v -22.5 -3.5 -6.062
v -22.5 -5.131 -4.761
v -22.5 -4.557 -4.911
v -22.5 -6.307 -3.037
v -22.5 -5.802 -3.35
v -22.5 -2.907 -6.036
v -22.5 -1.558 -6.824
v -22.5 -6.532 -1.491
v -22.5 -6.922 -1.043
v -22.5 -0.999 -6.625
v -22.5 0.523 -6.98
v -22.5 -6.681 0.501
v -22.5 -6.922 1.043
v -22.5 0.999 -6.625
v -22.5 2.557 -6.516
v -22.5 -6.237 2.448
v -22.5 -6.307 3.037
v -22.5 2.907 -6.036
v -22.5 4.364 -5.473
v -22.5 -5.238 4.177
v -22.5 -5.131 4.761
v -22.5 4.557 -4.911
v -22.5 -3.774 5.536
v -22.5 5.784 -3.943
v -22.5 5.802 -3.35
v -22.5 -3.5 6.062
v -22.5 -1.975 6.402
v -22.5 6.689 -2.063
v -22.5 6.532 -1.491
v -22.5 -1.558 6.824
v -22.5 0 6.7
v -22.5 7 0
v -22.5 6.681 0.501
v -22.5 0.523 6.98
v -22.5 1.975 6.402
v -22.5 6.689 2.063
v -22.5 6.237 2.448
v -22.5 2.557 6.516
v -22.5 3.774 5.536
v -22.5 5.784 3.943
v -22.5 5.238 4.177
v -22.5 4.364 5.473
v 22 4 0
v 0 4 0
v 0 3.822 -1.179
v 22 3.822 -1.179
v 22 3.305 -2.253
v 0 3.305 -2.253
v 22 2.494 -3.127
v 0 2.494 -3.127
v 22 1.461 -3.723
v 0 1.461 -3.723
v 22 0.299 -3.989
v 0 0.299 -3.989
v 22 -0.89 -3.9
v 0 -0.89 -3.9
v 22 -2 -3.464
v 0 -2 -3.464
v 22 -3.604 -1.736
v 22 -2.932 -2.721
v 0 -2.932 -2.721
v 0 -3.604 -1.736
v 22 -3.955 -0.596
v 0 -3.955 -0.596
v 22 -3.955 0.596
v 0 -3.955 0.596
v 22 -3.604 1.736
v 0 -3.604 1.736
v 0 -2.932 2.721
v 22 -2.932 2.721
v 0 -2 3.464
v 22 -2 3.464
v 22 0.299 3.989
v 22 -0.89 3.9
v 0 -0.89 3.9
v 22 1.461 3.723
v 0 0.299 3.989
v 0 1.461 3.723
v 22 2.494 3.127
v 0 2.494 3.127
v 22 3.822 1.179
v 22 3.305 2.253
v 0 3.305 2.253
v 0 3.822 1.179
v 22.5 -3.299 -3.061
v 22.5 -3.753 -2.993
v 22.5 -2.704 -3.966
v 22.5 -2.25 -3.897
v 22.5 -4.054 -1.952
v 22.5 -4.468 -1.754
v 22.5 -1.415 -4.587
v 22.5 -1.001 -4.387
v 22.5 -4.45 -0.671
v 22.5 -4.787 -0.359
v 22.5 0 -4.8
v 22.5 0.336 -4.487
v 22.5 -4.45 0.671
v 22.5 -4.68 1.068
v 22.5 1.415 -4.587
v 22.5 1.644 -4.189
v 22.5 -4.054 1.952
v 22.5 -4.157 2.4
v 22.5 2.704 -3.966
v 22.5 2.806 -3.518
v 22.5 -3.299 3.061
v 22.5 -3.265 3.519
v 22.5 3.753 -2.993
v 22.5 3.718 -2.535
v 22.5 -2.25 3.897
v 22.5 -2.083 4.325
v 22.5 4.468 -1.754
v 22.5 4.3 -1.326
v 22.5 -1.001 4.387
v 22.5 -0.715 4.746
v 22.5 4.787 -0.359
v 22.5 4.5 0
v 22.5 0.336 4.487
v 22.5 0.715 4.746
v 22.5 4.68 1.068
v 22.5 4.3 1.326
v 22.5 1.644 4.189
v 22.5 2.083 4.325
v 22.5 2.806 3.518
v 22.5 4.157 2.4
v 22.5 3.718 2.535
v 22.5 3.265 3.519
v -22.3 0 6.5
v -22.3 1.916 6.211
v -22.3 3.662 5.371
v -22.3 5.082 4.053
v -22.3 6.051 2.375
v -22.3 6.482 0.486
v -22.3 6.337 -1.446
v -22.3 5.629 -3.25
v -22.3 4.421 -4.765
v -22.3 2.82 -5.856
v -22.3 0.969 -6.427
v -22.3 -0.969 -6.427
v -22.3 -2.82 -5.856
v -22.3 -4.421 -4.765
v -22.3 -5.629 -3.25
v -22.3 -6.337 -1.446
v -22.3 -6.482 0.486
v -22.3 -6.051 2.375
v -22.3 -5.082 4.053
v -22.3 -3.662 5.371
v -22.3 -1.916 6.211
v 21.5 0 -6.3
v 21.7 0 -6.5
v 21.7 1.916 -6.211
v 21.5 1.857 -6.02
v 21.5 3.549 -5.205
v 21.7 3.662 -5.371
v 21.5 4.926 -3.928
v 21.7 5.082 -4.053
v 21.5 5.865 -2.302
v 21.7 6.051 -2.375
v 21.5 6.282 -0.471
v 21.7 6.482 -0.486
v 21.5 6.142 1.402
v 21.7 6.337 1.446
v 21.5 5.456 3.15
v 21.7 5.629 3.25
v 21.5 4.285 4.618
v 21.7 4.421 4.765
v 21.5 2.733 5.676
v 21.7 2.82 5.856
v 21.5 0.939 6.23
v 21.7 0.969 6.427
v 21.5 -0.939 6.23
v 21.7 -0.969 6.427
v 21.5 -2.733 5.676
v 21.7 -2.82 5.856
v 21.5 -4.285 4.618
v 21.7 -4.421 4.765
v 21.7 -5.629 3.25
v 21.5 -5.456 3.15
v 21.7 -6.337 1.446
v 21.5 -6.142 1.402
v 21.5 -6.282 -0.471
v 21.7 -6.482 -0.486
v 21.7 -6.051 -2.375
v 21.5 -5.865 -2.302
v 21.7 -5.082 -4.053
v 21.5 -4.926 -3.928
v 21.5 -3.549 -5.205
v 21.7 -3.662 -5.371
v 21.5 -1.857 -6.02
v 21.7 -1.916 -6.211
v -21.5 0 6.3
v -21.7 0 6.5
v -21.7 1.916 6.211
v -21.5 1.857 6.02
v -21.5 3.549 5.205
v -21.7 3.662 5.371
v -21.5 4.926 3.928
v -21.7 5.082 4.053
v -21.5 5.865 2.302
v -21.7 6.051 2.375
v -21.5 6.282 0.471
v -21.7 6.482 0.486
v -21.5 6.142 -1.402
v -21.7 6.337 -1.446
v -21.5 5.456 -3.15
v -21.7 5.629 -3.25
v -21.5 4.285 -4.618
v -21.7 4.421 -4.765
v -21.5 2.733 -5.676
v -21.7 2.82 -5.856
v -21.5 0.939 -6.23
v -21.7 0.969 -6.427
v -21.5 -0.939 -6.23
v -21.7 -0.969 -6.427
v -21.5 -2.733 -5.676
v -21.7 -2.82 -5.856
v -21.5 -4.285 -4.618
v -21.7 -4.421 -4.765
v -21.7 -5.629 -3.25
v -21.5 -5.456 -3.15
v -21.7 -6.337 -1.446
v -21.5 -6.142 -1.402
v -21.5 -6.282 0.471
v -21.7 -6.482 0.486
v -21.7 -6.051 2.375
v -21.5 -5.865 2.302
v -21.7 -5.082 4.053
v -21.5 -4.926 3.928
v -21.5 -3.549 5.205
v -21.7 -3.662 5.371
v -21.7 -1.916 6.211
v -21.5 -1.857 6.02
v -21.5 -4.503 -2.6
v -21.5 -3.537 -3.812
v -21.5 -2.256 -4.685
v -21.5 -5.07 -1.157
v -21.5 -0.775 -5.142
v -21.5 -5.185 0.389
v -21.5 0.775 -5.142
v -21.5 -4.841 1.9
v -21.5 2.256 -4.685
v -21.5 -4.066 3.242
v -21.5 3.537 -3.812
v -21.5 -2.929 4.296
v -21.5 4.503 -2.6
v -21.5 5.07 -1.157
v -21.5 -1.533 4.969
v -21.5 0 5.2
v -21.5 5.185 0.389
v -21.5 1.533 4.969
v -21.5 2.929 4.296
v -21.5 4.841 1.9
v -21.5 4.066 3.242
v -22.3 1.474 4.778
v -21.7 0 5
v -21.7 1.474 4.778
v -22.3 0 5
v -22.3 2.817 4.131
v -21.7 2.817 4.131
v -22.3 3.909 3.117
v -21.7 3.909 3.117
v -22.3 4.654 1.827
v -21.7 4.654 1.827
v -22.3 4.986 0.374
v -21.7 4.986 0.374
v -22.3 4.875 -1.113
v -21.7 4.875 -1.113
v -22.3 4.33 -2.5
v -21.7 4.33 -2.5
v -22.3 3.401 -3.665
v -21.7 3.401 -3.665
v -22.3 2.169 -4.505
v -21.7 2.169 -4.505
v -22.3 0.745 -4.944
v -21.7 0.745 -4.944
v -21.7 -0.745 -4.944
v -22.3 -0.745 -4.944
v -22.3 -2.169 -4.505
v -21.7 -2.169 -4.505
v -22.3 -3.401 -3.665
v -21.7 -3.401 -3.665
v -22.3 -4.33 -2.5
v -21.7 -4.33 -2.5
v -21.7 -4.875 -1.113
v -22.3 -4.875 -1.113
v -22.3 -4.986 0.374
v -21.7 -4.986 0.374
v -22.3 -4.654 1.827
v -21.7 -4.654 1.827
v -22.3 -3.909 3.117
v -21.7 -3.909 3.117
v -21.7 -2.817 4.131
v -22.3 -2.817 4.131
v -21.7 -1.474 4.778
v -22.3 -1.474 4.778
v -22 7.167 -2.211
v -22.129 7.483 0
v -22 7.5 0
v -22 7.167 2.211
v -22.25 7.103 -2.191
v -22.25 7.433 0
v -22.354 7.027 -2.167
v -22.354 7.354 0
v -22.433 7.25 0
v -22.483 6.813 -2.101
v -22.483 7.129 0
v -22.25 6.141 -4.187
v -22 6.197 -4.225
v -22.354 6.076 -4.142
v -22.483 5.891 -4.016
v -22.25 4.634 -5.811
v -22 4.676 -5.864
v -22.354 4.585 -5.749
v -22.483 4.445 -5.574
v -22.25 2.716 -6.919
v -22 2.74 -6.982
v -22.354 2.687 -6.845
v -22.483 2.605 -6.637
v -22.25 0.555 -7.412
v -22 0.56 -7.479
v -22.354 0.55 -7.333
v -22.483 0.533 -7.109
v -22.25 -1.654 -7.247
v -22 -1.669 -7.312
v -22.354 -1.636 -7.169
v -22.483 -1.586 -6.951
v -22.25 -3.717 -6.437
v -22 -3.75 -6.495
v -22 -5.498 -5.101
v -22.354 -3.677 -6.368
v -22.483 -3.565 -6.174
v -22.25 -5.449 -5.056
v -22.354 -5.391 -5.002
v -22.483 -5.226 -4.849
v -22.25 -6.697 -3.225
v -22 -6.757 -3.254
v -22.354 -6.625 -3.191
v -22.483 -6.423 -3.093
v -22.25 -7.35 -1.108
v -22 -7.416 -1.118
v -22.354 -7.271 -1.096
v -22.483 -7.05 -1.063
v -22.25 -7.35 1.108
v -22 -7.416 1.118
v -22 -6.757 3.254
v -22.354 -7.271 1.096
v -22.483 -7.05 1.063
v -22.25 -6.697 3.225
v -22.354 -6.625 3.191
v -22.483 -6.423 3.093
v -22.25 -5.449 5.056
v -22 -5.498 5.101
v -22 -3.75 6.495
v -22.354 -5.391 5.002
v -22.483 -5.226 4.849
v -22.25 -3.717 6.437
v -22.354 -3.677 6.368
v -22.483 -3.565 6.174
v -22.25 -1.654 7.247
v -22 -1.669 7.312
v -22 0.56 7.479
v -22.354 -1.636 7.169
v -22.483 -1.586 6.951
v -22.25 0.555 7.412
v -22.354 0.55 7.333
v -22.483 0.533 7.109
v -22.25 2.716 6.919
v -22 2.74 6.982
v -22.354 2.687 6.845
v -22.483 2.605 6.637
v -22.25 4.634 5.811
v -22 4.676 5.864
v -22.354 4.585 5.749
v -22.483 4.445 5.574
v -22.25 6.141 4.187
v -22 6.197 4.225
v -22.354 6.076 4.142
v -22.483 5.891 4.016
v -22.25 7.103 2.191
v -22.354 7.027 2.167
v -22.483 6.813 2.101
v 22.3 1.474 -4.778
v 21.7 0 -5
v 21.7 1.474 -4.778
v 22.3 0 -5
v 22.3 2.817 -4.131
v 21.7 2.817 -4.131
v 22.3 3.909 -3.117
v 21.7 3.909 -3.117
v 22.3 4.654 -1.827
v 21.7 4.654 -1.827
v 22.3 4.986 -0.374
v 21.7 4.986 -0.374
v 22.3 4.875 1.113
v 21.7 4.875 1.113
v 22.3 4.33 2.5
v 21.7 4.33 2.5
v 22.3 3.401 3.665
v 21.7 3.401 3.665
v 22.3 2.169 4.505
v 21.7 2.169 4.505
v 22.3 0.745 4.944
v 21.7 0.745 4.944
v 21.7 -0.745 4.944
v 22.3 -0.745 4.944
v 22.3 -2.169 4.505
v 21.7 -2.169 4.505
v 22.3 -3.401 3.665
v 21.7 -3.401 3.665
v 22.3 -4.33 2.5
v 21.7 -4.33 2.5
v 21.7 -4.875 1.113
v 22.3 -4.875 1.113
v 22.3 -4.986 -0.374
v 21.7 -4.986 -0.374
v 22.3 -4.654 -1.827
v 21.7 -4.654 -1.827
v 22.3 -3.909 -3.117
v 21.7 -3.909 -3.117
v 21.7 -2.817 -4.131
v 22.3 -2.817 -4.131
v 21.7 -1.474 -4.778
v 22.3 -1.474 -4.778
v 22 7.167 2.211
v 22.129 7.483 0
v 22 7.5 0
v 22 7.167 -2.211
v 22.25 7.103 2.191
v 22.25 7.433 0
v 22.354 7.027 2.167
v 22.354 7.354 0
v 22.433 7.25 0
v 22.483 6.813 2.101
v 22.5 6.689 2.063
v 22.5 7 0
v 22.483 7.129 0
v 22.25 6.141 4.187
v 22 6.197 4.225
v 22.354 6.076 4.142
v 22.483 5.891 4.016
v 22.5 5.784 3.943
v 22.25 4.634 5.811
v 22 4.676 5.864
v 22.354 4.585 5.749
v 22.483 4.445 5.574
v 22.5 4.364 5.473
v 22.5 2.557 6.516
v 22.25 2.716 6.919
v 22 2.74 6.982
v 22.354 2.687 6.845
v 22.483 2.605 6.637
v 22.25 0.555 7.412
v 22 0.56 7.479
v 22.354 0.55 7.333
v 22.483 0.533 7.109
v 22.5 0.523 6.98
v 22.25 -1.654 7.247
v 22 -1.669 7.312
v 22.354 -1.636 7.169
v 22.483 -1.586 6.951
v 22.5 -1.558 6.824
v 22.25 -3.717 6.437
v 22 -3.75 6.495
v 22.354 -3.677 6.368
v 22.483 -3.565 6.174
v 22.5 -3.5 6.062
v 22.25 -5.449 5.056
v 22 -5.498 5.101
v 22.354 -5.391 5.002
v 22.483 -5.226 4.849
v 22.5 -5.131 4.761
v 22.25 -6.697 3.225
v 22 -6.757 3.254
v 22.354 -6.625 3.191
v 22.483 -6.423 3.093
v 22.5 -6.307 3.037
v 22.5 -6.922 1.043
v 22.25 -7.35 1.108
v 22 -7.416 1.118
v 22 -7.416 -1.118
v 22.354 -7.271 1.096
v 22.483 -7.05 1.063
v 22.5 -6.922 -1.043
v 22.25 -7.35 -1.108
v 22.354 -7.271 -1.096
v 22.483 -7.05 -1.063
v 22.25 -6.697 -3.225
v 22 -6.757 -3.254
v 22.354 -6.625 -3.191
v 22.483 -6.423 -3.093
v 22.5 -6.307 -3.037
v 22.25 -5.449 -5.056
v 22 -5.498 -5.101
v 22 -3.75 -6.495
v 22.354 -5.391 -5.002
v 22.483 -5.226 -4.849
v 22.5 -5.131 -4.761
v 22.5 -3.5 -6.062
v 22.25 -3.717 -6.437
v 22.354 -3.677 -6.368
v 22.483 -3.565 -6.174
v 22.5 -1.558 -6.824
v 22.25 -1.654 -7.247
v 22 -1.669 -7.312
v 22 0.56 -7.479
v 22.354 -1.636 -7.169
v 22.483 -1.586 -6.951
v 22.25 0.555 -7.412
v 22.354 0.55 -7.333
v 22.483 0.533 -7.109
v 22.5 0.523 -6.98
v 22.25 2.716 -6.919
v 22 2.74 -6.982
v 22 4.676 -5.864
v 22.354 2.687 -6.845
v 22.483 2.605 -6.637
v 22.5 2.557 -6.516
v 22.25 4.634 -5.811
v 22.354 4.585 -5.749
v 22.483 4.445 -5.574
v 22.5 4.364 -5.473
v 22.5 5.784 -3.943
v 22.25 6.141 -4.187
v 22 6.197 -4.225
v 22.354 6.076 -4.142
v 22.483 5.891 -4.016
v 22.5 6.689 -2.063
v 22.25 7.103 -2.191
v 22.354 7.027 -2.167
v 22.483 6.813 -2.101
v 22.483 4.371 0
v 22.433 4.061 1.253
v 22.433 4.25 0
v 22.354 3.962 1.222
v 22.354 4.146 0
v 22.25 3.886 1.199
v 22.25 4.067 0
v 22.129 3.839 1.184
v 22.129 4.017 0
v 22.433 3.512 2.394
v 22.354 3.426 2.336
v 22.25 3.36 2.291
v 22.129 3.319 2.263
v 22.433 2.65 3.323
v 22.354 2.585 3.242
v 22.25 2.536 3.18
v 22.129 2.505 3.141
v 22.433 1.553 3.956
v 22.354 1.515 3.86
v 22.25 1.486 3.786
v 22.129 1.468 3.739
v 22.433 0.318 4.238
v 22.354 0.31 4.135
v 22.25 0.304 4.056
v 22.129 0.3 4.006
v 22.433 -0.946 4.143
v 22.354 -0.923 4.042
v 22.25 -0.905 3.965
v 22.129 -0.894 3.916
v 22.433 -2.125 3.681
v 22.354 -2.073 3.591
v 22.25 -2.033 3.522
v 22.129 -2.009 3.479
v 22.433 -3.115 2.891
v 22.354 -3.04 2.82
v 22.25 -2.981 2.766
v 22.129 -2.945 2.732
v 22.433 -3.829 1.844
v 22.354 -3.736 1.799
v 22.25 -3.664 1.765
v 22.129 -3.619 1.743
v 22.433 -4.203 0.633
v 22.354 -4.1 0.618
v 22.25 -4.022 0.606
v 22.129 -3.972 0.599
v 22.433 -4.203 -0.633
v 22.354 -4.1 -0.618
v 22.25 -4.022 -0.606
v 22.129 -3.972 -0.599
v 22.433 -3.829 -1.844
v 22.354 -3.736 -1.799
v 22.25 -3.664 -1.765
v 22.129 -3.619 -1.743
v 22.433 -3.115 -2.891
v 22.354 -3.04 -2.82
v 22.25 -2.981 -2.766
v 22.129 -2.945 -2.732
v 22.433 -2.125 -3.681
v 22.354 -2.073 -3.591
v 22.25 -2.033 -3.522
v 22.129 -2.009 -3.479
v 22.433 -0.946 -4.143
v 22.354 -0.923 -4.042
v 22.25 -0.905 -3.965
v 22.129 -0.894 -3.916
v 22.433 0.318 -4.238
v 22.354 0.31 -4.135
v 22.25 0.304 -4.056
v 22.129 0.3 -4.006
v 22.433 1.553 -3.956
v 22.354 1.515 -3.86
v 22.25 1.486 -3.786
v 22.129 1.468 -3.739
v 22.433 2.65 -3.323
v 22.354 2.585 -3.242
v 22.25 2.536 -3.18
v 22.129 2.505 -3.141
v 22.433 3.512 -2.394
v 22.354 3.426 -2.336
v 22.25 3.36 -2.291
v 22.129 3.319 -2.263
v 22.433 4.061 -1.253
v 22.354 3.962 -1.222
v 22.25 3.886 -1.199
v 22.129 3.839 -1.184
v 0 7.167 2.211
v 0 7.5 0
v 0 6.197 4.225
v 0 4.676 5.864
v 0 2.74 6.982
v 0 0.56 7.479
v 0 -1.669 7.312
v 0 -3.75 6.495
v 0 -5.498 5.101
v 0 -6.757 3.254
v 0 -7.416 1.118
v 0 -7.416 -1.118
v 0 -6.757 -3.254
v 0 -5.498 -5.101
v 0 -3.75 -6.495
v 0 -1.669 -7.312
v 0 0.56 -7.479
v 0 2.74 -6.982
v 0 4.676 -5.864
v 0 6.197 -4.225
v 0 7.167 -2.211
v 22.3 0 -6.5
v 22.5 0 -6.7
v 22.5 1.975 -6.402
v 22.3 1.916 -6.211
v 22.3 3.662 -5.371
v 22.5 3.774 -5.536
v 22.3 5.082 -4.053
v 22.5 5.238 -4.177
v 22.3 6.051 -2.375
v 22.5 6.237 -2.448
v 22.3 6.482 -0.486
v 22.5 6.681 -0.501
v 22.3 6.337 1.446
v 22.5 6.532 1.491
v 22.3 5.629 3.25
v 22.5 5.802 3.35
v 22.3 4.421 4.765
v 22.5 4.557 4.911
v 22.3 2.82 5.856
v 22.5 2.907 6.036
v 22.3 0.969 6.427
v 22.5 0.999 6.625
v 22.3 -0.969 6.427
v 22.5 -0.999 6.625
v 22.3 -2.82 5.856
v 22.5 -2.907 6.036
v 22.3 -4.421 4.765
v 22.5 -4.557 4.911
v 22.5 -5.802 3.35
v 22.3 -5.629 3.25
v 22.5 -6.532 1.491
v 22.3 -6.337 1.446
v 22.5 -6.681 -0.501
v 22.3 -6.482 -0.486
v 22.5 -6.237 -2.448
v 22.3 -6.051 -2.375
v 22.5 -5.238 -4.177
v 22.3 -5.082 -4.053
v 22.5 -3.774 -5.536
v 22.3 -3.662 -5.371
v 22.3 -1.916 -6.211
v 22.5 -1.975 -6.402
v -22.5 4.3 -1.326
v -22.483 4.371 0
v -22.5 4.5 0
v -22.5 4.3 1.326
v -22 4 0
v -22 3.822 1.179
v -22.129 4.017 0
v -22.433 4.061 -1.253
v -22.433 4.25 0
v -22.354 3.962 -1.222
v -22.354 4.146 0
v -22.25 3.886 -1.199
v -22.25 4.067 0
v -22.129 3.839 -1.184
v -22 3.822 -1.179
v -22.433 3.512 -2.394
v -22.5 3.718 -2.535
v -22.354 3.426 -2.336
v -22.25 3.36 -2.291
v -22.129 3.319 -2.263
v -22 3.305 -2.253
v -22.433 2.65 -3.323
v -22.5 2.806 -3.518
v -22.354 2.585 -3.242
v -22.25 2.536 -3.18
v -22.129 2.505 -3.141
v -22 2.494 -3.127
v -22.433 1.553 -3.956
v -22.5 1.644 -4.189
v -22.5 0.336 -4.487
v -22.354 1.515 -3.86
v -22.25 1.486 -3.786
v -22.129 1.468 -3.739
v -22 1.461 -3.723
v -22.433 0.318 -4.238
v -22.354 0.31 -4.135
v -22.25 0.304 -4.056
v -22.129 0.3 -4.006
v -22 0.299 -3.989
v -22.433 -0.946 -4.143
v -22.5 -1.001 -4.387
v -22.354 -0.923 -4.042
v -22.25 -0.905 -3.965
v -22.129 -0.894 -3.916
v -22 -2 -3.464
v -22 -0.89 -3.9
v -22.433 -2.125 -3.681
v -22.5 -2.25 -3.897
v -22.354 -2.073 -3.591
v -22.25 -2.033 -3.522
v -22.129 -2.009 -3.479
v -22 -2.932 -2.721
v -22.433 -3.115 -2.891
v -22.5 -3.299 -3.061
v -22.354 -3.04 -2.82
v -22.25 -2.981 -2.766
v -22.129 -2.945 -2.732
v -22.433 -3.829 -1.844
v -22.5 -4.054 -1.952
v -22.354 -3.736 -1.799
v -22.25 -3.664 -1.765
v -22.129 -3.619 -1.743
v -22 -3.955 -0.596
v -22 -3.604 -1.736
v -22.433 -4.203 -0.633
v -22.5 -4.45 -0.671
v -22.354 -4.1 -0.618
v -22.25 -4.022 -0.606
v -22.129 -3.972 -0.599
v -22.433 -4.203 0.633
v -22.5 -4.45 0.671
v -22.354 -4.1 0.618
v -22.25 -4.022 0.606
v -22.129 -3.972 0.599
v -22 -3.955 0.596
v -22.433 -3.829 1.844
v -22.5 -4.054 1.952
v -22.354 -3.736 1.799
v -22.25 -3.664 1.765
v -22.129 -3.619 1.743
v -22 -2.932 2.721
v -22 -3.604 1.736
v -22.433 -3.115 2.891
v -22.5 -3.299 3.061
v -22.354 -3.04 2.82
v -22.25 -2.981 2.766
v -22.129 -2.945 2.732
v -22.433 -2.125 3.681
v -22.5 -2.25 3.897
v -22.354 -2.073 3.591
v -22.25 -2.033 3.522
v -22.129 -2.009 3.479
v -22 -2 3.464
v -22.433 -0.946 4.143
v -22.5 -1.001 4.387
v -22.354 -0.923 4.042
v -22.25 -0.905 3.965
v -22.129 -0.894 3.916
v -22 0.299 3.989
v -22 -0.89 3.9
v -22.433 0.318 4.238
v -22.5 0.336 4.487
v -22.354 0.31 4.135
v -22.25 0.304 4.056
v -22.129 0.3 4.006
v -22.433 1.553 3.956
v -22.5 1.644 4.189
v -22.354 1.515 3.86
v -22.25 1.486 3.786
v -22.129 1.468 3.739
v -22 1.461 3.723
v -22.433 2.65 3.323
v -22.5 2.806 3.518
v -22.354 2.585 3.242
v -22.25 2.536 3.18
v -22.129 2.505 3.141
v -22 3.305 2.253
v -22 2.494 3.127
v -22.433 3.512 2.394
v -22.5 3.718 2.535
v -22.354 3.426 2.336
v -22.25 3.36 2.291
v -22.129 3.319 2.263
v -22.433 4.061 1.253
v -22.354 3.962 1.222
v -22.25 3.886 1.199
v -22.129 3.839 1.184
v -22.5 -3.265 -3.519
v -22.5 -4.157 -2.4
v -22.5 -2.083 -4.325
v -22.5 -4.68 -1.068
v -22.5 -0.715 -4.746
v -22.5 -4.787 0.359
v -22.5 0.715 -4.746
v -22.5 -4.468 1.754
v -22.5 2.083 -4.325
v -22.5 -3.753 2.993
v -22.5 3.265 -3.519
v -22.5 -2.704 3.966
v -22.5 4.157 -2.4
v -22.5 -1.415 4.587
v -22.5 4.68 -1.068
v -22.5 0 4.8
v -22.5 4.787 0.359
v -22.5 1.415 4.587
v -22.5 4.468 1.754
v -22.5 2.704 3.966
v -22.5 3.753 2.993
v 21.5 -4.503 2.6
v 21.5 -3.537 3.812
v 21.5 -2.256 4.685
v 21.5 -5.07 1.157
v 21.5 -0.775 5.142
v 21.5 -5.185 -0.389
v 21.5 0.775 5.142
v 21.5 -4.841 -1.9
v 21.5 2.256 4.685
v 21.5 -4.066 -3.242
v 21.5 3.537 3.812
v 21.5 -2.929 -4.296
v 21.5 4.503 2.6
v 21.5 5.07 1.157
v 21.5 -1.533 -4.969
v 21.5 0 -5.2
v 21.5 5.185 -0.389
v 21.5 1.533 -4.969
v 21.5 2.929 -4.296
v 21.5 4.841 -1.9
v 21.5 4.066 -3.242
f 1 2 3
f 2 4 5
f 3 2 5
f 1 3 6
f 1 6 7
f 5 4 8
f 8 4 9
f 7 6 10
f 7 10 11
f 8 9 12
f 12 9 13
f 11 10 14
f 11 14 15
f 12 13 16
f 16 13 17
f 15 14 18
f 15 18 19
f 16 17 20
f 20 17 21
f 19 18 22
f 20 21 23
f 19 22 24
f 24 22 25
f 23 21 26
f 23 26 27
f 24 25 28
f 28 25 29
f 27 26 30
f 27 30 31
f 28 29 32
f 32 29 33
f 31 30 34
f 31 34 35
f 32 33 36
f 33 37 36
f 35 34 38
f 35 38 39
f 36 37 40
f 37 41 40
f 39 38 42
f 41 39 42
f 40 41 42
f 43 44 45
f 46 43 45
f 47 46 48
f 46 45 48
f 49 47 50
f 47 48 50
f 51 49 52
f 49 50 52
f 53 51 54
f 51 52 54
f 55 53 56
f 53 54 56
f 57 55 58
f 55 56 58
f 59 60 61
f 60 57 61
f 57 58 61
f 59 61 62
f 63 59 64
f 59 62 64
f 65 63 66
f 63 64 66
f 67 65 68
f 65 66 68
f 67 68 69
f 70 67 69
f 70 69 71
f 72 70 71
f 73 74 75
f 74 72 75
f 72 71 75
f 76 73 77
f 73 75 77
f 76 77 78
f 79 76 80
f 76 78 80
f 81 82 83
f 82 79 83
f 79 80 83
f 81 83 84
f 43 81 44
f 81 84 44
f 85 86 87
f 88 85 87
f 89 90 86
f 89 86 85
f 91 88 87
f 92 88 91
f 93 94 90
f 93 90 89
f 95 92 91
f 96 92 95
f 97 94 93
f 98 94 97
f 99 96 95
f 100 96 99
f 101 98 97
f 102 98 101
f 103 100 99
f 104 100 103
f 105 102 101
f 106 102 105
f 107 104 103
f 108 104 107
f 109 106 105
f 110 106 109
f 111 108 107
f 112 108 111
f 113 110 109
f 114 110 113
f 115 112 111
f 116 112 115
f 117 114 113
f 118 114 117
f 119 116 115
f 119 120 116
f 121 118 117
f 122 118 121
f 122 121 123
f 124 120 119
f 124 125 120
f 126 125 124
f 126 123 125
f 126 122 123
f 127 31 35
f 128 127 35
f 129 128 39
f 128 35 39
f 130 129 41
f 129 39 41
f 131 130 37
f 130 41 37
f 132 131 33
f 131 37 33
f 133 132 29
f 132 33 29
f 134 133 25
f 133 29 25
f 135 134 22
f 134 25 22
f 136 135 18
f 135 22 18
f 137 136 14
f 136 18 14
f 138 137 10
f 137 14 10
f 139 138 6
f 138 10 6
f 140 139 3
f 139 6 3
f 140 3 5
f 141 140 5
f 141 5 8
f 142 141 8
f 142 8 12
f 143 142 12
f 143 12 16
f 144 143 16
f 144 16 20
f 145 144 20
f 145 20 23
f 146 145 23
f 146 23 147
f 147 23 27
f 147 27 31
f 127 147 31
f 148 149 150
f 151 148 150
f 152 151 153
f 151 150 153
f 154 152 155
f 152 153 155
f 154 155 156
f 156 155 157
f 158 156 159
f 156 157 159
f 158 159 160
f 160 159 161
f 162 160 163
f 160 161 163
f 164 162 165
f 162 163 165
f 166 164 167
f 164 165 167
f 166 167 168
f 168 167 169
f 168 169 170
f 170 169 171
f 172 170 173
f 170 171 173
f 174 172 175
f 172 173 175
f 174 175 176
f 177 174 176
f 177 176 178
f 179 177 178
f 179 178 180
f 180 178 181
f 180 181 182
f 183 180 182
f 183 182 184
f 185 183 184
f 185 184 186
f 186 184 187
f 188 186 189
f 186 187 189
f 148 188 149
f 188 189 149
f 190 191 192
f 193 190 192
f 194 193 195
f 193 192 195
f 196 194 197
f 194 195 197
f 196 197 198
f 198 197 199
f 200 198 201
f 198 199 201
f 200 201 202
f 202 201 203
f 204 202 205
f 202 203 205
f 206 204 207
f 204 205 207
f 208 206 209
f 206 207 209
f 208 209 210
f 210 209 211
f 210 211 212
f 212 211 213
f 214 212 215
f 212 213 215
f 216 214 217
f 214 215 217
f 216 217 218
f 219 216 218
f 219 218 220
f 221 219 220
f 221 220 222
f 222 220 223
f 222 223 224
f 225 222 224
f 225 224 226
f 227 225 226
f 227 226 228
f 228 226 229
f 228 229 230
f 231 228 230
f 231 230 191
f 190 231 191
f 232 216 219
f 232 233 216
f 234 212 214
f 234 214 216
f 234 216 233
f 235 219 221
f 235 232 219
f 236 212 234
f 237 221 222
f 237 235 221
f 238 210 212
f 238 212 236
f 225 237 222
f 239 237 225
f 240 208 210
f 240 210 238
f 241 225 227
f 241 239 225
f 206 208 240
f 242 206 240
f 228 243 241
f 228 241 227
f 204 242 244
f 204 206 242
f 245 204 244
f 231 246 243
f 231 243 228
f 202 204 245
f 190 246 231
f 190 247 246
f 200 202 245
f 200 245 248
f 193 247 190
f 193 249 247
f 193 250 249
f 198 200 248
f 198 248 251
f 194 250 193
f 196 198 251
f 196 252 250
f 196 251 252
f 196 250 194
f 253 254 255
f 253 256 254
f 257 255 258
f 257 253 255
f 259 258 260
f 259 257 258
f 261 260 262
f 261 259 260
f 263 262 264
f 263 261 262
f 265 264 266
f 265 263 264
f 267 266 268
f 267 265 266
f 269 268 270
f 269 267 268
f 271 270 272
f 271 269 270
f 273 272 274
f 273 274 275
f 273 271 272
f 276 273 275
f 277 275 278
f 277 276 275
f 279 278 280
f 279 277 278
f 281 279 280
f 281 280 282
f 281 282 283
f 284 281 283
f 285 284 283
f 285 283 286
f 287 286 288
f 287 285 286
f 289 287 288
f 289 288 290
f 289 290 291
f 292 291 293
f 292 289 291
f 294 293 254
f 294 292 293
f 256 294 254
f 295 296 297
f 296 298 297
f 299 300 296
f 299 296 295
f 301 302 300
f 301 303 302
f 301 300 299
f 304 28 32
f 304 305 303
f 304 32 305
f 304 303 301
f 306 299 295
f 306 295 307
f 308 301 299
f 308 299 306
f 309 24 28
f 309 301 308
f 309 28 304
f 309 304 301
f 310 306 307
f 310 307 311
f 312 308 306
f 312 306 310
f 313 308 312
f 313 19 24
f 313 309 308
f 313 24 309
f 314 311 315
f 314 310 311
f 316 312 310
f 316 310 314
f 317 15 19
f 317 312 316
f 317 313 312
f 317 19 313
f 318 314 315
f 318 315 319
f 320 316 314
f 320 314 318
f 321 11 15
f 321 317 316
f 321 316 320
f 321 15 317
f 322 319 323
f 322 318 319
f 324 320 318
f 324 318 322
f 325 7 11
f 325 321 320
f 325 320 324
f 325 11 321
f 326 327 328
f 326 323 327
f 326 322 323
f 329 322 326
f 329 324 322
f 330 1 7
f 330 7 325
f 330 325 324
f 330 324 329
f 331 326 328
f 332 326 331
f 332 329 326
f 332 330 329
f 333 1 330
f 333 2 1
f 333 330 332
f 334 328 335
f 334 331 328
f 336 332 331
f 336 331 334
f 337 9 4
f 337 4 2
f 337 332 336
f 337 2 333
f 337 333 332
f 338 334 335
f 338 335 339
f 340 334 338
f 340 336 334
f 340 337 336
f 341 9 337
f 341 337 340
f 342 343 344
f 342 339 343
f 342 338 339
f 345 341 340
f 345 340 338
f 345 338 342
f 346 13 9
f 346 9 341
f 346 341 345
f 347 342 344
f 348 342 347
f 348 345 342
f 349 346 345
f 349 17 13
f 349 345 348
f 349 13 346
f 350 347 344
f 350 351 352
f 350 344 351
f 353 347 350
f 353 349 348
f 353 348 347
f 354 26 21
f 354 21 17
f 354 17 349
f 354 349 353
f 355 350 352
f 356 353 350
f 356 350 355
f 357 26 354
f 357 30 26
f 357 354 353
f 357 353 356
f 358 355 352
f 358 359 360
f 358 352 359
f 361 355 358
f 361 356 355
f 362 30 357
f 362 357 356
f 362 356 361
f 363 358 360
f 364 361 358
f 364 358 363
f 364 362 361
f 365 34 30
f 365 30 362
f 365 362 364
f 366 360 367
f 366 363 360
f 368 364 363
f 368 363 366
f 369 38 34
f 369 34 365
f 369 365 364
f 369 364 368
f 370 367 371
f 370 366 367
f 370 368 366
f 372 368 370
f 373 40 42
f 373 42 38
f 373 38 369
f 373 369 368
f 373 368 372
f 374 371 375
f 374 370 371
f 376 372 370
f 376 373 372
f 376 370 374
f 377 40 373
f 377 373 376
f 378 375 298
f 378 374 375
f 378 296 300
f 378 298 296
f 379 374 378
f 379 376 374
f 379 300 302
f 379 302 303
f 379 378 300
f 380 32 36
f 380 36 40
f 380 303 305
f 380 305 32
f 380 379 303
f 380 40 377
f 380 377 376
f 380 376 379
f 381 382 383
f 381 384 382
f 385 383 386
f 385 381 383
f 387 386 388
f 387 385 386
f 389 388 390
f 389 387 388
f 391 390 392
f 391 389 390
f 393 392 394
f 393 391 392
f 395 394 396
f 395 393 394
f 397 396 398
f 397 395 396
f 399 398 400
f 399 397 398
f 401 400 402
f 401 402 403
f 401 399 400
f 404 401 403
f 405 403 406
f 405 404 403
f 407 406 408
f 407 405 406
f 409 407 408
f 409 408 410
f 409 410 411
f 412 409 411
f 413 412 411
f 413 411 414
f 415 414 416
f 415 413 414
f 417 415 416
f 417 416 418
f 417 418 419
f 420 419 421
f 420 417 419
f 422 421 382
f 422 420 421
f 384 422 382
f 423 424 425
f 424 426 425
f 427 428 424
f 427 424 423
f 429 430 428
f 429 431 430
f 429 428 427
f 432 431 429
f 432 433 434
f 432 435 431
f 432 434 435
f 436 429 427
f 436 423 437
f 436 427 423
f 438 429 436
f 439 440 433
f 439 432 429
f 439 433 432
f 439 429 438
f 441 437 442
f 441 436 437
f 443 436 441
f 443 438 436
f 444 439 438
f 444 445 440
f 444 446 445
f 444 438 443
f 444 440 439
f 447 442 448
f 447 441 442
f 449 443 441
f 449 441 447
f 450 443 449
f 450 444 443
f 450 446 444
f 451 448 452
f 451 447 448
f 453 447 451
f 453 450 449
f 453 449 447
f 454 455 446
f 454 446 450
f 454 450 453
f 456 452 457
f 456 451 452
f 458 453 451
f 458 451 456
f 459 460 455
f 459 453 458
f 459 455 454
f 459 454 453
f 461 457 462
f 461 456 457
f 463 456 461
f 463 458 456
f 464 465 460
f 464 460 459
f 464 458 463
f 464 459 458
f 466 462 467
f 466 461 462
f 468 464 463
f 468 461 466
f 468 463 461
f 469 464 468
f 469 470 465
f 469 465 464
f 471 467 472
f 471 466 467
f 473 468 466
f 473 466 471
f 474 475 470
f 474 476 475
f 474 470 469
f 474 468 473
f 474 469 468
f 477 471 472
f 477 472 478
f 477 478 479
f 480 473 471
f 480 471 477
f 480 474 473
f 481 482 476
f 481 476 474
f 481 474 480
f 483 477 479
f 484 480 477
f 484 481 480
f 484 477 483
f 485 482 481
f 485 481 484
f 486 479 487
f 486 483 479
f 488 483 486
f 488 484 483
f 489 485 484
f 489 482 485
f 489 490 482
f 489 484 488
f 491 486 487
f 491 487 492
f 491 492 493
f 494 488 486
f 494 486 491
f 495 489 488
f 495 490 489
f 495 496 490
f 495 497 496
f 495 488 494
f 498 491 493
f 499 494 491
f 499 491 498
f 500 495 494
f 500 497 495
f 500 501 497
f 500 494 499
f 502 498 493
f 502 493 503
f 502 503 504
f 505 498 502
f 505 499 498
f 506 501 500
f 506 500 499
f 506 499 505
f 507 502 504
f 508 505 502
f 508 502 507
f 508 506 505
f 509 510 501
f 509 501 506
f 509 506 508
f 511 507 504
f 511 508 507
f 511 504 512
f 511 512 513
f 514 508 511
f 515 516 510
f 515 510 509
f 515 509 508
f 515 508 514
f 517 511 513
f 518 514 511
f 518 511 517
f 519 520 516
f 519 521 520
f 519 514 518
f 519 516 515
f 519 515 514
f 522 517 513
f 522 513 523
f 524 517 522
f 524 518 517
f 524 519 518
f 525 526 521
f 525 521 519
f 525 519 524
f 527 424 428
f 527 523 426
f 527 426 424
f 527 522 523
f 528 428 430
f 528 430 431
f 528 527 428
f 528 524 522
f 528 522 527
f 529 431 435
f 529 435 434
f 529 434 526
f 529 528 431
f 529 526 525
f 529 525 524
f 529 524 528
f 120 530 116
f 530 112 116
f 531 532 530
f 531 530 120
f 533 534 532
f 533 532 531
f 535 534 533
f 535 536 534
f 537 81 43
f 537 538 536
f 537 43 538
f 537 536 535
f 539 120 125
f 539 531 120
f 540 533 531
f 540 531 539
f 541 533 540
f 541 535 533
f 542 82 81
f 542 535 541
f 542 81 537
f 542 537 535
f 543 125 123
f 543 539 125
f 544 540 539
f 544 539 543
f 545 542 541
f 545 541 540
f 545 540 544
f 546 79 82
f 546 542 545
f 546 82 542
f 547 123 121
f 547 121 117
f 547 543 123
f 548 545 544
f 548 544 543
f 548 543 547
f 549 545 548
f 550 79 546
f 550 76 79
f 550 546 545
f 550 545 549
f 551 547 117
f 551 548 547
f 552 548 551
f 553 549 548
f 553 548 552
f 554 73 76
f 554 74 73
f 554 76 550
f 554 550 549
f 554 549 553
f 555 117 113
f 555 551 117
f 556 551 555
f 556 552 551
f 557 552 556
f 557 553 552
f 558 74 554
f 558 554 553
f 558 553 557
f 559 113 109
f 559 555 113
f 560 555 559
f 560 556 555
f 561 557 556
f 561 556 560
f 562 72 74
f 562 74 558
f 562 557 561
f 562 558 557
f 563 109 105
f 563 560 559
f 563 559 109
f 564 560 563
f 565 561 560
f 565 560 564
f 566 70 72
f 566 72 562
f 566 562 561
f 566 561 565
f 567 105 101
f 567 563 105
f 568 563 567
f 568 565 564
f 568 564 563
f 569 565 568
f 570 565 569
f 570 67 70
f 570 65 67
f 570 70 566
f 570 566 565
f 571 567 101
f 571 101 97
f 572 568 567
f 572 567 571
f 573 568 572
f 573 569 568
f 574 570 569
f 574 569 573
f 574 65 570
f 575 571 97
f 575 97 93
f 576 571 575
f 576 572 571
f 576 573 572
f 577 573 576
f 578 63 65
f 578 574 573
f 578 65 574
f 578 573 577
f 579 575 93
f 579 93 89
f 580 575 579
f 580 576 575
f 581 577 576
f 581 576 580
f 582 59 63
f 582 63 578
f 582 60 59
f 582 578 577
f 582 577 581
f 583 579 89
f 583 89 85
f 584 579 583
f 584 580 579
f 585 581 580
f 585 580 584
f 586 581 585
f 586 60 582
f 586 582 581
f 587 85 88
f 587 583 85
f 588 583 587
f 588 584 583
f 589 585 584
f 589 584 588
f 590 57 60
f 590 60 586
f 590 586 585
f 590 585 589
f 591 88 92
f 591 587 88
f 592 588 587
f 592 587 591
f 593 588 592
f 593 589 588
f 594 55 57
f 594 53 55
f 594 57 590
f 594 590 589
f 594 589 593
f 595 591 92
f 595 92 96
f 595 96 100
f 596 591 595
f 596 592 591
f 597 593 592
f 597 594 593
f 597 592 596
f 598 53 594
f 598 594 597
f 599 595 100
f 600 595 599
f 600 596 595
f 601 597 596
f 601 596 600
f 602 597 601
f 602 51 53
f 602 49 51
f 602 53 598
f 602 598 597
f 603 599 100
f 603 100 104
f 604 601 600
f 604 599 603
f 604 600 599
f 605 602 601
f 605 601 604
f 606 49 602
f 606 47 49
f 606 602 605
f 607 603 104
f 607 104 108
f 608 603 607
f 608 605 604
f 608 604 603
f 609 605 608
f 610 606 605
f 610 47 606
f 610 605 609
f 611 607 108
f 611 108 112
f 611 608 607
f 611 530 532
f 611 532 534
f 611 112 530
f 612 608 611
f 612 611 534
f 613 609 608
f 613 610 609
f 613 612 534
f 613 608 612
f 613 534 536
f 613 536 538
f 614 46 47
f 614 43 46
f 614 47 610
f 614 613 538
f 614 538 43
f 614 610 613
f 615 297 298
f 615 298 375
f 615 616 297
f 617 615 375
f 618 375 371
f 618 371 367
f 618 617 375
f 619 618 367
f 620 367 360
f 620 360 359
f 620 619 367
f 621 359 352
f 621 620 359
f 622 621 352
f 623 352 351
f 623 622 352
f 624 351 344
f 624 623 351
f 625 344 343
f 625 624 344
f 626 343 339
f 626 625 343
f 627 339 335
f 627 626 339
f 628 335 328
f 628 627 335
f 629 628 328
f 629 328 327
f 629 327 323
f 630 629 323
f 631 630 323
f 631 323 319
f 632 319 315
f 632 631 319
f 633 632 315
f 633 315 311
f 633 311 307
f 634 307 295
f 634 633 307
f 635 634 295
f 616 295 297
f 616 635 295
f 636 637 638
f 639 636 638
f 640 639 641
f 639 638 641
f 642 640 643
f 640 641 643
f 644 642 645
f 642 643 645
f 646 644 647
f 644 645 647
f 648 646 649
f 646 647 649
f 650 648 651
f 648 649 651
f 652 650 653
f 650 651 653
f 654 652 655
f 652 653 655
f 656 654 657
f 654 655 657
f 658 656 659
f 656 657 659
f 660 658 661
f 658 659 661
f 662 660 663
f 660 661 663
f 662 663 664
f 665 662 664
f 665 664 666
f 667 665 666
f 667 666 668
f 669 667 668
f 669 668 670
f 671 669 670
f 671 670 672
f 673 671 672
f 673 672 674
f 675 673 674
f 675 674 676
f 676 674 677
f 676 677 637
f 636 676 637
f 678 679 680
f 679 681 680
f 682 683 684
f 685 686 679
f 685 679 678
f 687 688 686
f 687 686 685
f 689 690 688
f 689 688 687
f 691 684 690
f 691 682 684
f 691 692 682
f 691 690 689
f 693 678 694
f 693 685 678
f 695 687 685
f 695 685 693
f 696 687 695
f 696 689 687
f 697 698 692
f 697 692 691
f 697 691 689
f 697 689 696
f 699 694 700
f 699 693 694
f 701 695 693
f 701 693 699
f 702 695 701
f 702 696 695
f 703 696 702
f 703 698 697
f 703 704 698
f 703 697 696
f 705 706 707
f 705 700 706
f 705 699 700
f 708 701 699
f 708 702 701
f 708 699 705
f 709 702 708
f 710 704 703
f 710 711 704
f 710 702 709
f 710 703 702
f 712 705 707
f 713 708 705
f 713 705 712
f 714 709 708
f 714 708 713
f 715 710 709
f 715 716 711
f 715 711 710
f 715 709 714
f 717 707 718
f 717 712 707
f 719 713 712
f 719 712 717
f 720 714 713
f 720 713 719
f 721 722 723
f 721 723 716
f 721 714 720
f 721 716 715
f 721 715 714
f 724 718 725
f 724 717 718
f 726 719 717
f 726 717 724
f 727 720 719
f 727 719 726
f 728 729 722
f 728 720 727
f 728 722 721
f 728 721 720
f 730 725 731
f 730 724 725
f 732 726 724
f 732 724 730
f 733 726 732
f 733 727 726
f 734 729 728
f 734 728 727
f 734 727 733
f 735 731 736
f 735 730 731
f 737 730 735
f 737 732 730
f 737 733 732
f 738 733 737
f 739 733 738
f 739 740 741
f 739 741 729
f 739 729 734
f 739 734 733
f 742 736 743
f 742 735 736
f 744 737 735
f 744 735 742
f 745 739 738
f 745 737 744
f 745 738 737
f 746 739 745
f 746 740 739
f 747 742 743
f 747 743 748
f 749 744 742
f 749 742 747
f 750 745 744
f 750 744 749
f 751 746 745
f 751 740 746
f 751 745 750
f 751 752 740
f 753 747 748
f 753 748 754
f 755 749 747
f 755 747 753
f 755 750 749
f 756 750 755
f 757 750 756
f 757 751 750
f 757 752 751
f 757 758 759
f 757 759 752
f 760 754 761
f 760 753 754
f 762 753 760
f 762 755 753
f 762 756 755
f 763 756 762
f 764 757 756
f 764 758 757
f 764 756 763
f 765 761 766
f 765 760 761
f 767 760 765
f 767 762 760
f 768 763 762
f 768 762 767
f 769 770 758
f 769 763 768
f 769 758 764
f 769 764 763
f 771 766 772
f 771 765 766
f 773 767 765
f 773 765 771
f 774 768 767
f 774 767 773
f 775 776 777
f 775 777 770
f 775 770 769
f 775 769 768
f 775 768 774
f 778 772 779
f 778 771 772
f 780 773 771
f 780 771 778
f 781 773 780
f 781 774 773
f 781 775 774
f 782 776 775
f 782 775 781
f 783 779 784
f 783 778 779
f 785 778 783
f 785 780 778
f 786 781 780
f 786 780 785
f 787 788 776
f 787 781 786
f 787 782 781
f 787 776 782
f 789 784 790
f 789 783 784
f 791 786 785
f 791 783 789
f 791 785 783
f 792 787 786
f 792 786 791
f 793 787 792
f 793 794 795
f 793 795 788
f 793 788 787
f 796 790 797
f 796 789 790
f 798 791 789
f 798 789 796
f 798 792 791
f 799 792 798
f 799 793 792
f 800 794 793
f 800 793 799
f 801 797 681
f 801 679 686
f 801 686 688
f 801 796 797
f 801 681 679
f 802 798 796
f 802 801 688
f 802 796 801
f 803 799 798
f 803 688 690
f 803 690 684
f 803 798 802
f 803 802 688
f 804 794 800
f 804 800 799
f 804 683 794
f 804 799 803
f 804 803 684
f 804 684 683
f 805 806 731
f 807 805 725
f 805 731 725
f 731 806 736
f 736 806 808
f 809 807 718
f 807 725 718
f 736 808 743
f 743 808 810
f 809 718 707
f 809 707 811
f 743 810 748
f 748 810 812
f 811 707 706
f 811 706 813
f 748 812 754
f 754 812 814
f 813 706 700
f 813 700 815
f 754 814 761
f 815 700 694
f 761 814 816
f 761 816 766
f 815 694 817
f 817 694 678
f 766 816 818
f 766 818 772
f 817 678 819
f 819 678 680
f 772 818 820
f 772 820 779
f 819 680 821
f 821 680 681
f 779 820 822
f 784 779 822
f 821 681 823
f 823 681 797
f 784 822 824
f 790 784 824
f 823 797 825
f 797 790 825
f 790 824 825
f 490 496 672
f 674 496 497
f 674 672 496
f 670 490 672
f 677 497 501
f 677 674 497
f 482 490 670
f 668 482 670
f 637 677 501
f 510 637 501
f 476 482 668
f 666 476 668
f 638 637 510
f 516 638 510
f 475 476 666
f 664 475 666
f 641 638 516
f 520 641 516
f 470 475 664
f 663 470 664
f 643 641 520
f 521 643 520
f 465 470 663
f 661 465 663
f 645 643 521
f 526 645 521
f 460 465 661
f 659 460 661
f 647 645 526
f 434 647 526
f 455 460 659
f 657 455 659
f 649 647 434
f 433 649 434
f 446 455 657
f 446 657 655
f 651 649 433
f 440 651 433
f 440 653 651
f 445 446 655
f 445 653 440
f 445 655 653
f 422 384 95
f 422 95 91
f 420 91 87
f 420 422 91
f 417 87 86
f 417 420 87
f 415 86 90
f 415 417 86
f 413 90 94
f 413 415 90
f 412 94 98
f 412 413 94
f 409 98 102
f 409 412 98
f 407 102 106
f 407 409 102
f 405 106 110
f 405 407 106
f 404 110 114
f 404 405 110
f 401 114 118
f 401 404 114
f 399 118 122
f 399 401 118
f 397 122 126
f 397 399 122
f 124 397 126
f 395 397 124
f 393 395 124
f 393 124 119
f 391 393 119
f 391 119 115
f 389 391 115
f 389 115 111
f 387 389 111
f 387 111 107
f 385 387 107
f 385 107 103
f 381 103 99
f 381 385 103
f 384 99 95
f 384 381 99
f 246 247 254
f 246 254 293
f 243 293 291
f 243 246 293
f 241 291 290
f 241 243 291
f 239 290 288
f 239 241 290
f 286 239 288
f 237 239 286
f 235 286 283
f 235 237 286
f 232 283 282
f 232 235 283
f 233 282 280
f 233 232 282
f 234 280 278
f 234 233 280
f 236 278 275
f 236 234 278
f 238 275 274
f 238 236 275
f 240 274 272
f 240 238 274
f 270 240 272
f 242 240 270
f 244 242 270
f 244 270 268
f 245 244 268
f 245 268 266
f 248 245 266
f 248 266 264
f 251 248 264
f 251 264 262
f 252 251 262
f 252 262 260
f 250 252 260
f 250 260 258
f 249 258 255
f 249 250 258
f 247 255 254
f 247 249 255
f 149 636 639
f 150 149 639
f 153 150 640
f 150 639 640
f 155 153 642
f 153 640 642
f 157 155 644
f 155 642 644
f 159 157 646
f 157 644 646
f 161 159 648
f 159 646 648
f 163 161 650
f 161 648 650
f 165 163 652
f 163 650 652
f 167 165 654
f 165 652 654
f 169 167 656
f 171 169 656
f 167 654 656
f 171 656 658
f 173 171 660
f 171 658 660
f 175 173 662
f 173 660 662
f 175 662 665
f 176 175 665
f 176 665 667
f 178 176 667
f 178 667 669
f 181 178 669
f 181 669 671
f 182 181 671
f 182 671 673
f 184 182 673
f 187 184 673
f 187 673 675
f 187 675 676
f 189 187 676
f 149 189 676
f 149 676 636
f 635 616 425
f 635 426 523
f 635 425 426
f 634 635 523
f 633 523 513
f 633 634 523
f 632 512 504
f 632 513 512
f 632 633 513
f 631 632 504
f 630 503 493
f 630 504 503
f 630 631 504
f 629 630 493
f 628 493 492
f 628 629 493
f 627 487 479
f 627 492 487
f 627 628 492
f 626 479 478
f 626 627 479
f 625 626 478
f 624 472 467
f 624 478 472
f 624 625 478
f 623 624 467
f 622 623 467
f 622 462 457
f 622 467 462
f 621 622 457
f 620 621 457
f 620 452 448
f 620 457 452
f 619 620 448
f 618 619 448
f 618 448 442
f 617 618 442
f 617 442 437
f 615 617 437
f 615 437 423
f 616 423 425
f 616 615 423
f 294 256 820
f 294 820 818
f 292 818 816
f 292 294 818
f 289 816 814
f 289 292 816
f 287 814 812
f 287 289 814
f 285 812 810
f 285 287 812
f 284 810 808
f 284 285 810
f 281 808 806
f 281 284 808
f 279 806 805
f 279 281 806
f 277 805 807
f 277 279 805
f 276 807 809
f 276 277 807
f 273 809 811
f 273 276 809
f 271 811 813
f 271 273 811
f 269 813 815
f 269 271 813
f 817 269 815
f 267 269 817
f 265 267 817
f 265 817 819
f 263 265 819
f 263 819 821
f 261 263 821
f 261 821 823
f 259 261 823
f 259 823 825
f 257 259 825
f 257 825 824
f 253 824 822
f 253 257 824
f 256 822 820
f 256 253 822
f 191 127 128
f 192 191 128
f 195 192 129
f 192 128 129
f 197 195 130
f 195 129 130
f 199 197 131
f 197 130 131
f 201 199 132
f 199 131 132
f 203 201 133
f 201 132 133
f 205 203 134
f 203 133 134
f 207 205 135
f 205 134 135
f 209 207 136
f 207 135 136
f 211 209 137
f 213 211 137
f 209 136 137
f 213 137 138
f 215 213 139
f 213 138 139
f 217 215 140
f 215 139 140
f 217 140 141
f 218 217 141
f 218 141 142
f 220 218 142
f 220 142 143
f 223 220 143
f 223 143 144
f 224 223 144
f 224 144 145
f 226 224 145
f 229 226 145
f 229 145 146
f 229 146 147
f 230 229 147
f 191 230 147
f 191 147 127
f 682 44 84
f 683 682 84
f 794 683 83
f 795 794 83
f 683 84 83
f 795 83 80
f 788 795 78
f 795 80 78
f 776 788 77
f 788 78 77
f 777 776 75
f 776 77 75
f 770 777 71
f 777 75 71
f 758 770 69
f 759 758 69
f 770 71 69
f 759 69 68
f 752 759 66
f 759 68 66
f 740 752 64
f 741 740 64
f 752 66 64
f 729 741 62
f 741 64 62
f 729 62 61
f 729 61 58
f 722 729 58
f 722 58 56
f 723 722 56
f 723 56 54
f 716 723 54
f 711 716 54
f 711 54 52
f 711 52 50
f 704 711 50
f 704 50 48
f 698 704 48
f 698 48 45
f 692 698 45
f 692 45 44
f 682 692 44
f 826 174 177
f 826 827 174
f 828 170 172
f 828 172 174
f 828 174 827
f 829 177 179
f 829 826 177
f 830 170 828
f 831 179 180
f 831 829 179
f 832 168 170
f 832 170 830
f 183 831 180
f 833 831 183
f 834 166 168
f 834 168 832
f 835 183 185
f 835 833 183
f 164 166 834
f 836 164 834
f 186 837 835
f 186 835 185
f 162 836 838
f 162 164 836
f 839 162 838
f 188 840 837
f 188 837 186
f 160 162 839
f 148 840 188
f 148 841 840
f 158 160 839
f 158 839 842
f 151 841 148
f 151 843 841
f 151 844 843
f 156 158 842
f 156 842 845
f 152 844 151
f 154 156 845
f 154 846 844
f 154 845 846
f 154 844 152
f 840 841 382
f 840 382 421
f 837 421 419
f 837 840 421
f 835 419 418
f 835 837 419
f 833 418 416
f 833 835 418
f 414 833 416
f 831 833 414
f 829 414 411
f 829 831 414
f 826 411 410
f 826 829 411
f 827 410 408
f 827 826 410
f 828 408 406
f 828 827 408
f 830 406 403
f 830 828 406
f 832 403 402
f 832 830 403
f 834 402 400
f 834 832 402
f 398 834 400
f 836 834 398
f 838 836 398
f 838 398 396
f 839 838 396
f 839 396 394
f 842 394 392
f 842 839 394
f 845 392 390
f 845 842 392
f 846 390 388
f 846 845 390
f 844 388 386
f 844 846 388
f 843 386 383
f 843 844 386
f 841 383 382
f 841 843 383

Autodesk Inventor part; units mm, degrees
ref_plane "YZ Plane" through (0, 0, 0) normal (1, 0, 0) x (0, 1, 0)
ref_plane "XZ Plane" through (0, 0, 0) normal (0, 1, 0) x (-1, 0, 0)
ref_plane "XY Plane" through (0, 0, 0) normal (0, 0, 1) x (1, 0, 0)
sketch "Эскиз1" plane through (0, 0, 0) normal (1, 0, 0) x (0, 1, 0)
  circle A0 centre (0, 0) radius 7.5
  circle A1 centre (0, 0) radius 4
  dimension "d0" = 15
  dimension "d1" = 8
extrude "Выдавливание1" add sketch "Эскиз1" along normal mid plane 45
sketch "Эскиз2" plane through (22.5, 0, 0) normal (1, 0, 0) x (0, 0, -1)
  circle A0 centre (0, 0) radius 5
  circle A1 centre (0, 0) radius 6.5
  dimension "d4" = 10
  dimension "d5" = 13
extrude "Выдавливание2" cut sketch "Эскиз2" against normal blind 1
sketch "Эскиз3" plane through (-22.5, 0, 0) normal (-1, 0, 0) x (0, 0, 1)
  circle A0 centre (0, 0) radius 6.5
  circle A1 centre (0, 0) radius 5
  dimension "d9" = 13
  dimension "d10" = 10
extrude "Выдавливание3" cut sketch "Эскиз3" against normal blind 1
fillet "Сопряжение1" radius 0.5 1 edges at (-22.5, -7.5, 0)
fillet "Сопряжение2" radius 0.5 3 edges at (-22.5, -4, 0) (22.5, -7.5, 0) (22.5, -4, 0)
chamfer "Фаска1" distance 0.2 angle 45 8 edges at (22.5, 0, 5) (22.5, 0, 6.5) (-22.5, 0, -5) (-22.5, 0, -6.5) (-21.5, 0, -5) (-21.5, 0, -6.5) (21.5, 0, 6.5) (21.5, 0, 5)
properties part number "LM8LUU"
